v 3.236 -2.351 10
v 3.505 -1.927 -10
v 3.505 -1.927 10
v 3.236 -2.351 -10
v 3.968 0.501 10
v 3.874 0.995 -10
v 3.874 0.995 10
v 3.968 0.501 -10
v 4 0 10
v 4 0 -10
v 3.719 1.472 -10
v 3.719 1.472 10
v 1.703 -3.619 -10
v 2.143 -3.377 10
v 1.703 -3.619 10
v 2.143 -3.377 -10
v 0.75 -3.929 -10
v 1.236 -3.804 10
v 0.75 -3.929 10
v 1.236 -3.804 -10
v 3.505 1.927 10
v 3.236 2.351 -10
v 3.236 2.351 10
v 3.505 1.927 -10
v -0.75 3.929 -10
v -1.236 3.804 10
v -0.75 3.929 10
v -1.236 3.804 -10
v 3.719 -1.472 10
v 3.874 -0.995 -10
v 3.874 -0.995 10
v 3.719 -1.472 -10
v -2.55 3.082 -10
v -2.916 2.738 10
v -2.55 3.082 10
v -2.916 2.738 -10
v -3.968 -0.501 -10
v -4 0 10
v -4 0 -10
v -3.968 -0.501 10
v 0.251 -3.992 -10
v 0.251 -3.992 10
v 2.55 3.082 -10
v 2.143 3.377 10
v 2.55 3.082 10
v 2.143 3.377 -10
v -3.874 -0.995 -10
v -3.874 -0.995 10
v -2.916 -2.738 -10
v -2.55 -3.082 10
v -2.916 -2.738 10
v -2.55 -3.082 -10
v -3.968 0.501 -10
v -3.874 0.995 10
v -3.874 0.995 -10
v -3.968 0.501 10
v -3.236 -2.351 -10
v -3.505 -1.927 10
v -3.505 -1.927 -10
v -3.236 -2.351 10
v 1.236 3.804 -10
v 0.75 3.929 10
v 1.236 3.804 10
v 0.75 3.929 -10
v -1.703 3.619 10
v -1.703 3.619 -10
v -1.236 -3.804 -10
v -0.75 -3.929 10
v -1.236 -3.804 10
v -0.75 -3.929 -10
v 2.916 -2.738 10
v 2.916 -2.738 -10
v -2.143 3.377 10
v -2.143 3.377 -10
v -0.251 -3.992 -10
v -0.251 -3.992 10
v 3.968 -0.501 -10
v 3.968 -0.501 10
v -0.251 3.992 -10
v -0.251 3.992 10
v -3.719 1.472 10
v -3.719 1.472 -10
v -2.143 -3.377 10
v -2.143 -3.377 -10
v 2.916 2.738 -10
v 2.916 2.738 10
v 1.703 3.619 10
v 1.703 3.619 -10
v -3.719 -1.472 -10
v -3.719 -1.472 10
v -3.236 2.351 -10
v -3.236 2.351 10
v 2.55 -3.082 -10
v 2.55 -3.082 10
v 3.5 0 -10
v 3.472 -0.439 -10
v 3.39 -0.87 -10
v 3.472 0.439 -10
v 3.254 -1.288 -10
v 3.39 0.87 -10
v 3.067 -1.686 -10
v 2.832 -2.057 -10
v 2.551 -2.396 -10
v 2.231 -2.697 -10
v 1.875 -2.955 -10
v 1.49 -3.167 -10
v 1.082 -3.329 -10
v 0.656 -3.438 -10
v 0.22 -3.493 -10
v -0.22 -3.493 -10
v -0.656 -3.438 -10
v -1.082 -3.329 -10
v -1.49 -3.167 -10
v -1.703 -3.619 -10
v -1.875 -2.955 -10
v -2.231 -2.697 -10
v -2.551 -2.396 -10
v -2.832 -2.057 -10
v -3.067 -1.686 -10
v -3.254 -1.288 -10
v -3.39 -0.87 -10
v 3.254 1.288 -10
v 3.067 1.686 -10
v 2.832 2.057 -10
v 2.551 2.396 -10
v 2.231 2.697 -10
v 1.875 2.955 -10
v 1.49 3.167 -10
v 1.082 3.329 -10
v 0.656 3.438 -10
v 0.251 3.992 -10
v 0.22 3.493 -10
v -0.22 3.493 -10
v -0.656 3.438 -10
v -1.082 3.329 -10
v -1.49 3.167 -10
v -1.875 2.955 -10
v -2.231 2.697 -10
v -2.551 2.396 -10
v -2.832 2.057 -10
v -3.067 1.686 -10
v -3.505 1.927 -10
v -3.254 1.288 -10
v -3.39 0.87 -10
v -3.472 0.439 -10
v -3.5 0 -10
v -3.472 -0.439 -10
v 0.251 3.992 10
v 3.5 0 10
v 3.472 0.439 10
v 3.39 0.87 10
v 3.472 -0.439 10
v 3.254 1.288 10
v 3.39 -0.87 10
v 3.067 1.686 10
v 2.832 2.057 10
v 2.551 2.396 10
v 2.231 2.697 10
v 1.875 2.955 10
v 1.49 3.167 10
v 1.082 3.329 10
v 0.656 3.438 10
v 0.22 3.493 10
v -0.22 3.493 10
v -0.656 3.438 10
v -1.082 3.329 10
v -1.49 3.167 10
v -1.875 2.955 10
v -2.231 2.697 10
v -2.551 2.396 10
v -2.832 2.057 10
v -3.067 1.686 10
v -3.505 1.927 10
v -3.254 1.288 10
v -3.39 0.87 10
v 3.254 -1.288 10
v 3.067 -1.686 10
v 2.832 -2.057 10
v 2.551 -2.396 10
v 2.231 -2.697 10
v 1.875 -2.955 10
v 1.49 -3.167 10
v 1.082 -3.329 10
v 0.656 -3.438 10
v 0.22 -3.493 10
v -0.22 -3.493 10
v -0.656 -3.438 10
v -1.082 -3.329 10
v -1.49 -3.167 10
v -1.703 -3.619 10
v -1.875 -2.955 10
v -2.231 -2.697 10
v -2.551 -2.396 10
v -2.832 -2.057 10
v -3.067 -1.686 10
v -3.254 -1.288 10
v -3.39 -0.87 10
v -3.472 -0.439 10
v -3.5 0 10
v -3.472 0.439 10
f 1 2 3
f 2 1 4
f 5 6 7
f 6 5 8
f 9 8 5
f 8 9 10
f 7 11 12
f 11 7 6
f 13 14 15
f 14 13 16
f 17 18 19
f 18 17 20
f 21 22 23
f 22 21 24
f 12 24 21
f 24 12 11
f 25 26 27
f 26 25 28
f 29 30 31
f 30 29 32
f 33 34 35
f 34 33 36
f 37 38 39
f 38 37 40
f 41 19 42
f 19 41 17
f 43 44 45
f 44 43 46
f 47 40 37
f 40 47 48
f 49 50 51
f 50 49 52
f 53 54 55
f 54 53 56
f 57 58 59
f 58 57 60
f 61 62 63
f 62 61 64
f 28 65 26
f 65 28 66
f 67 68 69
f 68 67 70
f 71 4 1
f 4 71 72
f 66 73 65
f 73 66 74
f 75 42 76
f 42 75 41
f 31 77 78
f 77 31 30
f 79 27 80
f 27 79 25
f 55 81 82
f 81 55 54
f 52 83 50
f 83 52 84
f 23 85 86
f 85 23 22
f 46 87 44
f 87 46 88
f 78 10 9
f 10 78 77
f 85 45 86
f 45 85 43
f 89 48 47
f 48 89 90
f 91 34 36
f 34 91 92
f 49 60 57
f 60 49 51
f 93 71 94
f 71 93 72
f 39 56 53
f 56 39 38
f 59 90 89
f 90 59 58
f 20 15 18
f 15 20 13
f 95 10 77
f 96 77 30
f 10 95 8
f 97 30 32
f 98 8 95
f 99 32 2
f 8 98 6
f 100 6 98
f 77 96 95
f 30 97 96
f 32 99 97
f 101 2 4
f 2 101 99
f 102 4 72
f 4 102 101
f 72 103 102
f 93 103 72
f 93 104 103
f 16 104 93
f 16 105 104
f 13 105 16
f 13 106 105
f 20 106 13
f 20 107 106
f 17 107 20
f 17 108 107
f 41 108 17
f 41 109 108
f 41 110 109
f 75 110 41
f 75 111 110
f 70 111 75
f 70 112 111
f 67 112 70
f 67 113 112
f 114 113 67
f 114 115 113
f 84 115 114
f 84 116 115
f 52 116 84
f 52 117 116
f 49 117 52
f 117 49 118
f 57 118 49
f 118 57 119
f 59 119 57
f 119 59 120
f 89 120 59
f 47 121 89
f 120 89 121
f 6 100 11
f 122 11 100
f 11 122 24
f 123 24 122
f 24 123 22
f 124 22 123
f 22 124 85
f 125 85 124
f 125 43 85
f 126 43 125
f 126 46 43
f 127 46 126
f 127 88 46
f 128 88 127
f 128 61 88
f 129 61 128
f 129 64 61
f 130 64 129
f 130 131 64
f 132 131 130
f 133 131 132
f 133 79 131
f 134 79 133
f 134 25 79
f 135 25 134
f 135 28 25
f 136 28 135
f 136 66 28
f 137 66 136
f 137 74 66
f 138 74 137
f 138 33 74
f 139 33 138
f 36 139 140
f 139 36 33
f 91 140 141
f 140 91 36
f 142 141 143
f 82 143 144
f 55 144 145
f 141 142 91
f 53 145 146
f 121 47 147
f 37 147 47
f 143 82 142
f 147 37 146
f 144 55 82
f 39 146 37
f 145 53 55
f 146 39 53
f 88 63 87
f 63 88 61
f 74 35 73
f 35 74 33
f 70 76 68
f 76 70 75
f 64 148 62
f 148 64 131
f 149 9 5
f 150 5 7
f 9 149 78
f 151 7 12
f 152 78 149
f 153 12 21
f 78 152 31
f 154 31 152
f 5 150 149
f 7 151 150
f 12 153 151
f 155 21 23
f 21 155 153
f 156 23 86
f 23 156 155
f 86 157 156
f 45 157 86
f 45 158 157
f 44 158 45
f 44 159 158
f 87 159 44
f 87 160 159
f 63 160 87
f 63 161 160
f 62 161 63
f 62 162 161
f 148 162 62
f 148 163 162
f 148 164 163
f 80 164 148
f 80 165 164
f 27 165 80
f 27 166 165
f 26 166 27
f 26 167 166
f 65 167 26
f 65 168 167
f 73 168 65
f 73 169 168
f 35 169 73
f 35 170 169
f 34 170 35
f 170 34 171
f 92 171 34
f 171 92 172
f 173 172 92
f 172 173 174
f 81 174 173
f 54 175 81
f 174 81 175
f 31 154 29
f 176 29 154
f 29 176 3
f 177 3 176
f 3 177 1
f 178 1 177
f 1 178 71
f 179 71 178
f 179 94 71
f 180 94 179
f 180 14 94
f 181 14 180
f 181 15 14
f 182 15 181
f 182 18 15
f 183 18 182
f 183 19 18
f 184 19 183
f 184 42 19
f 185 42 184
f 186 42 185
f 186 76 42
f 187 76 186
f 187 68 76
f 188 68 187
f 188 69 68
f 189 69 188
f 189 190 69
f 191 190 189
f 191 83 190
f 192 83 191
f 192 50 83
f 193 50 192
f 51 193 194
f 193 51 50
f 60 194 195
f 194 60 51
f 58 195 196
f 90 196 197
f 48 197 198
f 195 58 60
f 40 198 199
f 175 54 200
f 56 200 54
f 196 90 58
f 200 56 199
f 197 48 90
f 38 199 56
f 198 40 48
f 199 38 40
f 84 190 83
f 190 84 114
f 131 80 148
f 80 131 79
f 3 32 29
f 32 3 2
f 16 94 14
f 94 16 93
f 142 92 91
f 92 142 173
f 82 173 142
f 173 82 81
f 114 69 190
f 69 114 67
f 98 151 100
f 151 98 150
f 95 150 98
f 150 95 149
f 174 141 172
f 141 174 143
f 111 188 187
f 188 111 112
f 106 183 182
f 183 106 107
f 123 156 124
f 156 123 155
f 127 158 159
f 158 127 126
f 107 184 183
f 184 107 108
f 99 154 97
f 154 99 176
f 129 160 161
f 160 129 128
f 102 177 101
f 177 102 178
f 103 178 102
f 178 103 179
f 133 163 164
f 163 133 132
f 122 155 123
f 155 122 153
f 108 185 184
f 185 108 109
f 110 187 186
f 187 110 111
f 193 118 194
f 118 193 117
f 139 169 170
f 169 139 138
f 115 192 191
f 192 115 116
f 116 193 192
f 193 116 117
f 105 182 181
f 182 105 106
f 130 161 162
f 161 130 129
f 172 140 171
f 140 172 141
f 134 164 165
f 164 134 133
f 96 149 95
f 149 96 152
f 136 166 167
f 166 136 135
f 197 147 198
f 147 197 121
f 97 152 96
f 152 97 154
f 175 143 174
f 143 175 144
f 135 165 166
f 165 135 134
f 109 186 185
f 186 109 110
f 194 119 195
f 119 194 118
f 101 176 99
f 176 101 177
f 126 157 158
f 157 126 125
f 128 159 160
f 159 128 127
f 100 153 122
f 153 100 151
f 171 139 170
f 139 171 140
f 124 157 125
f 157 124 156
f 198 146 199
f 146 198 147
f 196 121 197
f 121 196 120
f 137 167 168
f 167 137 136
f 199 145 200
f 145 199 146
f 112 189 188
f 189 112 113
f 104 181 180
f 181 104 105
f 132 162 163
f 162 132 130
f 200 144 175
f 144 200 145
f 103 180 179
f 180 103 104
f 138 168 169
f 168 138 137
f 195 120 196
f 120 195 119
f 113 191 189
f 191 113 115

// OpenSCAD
$fn = 50;


difference() {
	union() {
		translate(v = [0, 0, -10.0000000000]) {
			cylinder(h = 20, r = 4.0000000000);
		}
	}
	union() {
		translate(v = [0, 0, -100.0000000000]) {
			cylinder(h = 200, r = 3.5000000000);
		}
	}
}
